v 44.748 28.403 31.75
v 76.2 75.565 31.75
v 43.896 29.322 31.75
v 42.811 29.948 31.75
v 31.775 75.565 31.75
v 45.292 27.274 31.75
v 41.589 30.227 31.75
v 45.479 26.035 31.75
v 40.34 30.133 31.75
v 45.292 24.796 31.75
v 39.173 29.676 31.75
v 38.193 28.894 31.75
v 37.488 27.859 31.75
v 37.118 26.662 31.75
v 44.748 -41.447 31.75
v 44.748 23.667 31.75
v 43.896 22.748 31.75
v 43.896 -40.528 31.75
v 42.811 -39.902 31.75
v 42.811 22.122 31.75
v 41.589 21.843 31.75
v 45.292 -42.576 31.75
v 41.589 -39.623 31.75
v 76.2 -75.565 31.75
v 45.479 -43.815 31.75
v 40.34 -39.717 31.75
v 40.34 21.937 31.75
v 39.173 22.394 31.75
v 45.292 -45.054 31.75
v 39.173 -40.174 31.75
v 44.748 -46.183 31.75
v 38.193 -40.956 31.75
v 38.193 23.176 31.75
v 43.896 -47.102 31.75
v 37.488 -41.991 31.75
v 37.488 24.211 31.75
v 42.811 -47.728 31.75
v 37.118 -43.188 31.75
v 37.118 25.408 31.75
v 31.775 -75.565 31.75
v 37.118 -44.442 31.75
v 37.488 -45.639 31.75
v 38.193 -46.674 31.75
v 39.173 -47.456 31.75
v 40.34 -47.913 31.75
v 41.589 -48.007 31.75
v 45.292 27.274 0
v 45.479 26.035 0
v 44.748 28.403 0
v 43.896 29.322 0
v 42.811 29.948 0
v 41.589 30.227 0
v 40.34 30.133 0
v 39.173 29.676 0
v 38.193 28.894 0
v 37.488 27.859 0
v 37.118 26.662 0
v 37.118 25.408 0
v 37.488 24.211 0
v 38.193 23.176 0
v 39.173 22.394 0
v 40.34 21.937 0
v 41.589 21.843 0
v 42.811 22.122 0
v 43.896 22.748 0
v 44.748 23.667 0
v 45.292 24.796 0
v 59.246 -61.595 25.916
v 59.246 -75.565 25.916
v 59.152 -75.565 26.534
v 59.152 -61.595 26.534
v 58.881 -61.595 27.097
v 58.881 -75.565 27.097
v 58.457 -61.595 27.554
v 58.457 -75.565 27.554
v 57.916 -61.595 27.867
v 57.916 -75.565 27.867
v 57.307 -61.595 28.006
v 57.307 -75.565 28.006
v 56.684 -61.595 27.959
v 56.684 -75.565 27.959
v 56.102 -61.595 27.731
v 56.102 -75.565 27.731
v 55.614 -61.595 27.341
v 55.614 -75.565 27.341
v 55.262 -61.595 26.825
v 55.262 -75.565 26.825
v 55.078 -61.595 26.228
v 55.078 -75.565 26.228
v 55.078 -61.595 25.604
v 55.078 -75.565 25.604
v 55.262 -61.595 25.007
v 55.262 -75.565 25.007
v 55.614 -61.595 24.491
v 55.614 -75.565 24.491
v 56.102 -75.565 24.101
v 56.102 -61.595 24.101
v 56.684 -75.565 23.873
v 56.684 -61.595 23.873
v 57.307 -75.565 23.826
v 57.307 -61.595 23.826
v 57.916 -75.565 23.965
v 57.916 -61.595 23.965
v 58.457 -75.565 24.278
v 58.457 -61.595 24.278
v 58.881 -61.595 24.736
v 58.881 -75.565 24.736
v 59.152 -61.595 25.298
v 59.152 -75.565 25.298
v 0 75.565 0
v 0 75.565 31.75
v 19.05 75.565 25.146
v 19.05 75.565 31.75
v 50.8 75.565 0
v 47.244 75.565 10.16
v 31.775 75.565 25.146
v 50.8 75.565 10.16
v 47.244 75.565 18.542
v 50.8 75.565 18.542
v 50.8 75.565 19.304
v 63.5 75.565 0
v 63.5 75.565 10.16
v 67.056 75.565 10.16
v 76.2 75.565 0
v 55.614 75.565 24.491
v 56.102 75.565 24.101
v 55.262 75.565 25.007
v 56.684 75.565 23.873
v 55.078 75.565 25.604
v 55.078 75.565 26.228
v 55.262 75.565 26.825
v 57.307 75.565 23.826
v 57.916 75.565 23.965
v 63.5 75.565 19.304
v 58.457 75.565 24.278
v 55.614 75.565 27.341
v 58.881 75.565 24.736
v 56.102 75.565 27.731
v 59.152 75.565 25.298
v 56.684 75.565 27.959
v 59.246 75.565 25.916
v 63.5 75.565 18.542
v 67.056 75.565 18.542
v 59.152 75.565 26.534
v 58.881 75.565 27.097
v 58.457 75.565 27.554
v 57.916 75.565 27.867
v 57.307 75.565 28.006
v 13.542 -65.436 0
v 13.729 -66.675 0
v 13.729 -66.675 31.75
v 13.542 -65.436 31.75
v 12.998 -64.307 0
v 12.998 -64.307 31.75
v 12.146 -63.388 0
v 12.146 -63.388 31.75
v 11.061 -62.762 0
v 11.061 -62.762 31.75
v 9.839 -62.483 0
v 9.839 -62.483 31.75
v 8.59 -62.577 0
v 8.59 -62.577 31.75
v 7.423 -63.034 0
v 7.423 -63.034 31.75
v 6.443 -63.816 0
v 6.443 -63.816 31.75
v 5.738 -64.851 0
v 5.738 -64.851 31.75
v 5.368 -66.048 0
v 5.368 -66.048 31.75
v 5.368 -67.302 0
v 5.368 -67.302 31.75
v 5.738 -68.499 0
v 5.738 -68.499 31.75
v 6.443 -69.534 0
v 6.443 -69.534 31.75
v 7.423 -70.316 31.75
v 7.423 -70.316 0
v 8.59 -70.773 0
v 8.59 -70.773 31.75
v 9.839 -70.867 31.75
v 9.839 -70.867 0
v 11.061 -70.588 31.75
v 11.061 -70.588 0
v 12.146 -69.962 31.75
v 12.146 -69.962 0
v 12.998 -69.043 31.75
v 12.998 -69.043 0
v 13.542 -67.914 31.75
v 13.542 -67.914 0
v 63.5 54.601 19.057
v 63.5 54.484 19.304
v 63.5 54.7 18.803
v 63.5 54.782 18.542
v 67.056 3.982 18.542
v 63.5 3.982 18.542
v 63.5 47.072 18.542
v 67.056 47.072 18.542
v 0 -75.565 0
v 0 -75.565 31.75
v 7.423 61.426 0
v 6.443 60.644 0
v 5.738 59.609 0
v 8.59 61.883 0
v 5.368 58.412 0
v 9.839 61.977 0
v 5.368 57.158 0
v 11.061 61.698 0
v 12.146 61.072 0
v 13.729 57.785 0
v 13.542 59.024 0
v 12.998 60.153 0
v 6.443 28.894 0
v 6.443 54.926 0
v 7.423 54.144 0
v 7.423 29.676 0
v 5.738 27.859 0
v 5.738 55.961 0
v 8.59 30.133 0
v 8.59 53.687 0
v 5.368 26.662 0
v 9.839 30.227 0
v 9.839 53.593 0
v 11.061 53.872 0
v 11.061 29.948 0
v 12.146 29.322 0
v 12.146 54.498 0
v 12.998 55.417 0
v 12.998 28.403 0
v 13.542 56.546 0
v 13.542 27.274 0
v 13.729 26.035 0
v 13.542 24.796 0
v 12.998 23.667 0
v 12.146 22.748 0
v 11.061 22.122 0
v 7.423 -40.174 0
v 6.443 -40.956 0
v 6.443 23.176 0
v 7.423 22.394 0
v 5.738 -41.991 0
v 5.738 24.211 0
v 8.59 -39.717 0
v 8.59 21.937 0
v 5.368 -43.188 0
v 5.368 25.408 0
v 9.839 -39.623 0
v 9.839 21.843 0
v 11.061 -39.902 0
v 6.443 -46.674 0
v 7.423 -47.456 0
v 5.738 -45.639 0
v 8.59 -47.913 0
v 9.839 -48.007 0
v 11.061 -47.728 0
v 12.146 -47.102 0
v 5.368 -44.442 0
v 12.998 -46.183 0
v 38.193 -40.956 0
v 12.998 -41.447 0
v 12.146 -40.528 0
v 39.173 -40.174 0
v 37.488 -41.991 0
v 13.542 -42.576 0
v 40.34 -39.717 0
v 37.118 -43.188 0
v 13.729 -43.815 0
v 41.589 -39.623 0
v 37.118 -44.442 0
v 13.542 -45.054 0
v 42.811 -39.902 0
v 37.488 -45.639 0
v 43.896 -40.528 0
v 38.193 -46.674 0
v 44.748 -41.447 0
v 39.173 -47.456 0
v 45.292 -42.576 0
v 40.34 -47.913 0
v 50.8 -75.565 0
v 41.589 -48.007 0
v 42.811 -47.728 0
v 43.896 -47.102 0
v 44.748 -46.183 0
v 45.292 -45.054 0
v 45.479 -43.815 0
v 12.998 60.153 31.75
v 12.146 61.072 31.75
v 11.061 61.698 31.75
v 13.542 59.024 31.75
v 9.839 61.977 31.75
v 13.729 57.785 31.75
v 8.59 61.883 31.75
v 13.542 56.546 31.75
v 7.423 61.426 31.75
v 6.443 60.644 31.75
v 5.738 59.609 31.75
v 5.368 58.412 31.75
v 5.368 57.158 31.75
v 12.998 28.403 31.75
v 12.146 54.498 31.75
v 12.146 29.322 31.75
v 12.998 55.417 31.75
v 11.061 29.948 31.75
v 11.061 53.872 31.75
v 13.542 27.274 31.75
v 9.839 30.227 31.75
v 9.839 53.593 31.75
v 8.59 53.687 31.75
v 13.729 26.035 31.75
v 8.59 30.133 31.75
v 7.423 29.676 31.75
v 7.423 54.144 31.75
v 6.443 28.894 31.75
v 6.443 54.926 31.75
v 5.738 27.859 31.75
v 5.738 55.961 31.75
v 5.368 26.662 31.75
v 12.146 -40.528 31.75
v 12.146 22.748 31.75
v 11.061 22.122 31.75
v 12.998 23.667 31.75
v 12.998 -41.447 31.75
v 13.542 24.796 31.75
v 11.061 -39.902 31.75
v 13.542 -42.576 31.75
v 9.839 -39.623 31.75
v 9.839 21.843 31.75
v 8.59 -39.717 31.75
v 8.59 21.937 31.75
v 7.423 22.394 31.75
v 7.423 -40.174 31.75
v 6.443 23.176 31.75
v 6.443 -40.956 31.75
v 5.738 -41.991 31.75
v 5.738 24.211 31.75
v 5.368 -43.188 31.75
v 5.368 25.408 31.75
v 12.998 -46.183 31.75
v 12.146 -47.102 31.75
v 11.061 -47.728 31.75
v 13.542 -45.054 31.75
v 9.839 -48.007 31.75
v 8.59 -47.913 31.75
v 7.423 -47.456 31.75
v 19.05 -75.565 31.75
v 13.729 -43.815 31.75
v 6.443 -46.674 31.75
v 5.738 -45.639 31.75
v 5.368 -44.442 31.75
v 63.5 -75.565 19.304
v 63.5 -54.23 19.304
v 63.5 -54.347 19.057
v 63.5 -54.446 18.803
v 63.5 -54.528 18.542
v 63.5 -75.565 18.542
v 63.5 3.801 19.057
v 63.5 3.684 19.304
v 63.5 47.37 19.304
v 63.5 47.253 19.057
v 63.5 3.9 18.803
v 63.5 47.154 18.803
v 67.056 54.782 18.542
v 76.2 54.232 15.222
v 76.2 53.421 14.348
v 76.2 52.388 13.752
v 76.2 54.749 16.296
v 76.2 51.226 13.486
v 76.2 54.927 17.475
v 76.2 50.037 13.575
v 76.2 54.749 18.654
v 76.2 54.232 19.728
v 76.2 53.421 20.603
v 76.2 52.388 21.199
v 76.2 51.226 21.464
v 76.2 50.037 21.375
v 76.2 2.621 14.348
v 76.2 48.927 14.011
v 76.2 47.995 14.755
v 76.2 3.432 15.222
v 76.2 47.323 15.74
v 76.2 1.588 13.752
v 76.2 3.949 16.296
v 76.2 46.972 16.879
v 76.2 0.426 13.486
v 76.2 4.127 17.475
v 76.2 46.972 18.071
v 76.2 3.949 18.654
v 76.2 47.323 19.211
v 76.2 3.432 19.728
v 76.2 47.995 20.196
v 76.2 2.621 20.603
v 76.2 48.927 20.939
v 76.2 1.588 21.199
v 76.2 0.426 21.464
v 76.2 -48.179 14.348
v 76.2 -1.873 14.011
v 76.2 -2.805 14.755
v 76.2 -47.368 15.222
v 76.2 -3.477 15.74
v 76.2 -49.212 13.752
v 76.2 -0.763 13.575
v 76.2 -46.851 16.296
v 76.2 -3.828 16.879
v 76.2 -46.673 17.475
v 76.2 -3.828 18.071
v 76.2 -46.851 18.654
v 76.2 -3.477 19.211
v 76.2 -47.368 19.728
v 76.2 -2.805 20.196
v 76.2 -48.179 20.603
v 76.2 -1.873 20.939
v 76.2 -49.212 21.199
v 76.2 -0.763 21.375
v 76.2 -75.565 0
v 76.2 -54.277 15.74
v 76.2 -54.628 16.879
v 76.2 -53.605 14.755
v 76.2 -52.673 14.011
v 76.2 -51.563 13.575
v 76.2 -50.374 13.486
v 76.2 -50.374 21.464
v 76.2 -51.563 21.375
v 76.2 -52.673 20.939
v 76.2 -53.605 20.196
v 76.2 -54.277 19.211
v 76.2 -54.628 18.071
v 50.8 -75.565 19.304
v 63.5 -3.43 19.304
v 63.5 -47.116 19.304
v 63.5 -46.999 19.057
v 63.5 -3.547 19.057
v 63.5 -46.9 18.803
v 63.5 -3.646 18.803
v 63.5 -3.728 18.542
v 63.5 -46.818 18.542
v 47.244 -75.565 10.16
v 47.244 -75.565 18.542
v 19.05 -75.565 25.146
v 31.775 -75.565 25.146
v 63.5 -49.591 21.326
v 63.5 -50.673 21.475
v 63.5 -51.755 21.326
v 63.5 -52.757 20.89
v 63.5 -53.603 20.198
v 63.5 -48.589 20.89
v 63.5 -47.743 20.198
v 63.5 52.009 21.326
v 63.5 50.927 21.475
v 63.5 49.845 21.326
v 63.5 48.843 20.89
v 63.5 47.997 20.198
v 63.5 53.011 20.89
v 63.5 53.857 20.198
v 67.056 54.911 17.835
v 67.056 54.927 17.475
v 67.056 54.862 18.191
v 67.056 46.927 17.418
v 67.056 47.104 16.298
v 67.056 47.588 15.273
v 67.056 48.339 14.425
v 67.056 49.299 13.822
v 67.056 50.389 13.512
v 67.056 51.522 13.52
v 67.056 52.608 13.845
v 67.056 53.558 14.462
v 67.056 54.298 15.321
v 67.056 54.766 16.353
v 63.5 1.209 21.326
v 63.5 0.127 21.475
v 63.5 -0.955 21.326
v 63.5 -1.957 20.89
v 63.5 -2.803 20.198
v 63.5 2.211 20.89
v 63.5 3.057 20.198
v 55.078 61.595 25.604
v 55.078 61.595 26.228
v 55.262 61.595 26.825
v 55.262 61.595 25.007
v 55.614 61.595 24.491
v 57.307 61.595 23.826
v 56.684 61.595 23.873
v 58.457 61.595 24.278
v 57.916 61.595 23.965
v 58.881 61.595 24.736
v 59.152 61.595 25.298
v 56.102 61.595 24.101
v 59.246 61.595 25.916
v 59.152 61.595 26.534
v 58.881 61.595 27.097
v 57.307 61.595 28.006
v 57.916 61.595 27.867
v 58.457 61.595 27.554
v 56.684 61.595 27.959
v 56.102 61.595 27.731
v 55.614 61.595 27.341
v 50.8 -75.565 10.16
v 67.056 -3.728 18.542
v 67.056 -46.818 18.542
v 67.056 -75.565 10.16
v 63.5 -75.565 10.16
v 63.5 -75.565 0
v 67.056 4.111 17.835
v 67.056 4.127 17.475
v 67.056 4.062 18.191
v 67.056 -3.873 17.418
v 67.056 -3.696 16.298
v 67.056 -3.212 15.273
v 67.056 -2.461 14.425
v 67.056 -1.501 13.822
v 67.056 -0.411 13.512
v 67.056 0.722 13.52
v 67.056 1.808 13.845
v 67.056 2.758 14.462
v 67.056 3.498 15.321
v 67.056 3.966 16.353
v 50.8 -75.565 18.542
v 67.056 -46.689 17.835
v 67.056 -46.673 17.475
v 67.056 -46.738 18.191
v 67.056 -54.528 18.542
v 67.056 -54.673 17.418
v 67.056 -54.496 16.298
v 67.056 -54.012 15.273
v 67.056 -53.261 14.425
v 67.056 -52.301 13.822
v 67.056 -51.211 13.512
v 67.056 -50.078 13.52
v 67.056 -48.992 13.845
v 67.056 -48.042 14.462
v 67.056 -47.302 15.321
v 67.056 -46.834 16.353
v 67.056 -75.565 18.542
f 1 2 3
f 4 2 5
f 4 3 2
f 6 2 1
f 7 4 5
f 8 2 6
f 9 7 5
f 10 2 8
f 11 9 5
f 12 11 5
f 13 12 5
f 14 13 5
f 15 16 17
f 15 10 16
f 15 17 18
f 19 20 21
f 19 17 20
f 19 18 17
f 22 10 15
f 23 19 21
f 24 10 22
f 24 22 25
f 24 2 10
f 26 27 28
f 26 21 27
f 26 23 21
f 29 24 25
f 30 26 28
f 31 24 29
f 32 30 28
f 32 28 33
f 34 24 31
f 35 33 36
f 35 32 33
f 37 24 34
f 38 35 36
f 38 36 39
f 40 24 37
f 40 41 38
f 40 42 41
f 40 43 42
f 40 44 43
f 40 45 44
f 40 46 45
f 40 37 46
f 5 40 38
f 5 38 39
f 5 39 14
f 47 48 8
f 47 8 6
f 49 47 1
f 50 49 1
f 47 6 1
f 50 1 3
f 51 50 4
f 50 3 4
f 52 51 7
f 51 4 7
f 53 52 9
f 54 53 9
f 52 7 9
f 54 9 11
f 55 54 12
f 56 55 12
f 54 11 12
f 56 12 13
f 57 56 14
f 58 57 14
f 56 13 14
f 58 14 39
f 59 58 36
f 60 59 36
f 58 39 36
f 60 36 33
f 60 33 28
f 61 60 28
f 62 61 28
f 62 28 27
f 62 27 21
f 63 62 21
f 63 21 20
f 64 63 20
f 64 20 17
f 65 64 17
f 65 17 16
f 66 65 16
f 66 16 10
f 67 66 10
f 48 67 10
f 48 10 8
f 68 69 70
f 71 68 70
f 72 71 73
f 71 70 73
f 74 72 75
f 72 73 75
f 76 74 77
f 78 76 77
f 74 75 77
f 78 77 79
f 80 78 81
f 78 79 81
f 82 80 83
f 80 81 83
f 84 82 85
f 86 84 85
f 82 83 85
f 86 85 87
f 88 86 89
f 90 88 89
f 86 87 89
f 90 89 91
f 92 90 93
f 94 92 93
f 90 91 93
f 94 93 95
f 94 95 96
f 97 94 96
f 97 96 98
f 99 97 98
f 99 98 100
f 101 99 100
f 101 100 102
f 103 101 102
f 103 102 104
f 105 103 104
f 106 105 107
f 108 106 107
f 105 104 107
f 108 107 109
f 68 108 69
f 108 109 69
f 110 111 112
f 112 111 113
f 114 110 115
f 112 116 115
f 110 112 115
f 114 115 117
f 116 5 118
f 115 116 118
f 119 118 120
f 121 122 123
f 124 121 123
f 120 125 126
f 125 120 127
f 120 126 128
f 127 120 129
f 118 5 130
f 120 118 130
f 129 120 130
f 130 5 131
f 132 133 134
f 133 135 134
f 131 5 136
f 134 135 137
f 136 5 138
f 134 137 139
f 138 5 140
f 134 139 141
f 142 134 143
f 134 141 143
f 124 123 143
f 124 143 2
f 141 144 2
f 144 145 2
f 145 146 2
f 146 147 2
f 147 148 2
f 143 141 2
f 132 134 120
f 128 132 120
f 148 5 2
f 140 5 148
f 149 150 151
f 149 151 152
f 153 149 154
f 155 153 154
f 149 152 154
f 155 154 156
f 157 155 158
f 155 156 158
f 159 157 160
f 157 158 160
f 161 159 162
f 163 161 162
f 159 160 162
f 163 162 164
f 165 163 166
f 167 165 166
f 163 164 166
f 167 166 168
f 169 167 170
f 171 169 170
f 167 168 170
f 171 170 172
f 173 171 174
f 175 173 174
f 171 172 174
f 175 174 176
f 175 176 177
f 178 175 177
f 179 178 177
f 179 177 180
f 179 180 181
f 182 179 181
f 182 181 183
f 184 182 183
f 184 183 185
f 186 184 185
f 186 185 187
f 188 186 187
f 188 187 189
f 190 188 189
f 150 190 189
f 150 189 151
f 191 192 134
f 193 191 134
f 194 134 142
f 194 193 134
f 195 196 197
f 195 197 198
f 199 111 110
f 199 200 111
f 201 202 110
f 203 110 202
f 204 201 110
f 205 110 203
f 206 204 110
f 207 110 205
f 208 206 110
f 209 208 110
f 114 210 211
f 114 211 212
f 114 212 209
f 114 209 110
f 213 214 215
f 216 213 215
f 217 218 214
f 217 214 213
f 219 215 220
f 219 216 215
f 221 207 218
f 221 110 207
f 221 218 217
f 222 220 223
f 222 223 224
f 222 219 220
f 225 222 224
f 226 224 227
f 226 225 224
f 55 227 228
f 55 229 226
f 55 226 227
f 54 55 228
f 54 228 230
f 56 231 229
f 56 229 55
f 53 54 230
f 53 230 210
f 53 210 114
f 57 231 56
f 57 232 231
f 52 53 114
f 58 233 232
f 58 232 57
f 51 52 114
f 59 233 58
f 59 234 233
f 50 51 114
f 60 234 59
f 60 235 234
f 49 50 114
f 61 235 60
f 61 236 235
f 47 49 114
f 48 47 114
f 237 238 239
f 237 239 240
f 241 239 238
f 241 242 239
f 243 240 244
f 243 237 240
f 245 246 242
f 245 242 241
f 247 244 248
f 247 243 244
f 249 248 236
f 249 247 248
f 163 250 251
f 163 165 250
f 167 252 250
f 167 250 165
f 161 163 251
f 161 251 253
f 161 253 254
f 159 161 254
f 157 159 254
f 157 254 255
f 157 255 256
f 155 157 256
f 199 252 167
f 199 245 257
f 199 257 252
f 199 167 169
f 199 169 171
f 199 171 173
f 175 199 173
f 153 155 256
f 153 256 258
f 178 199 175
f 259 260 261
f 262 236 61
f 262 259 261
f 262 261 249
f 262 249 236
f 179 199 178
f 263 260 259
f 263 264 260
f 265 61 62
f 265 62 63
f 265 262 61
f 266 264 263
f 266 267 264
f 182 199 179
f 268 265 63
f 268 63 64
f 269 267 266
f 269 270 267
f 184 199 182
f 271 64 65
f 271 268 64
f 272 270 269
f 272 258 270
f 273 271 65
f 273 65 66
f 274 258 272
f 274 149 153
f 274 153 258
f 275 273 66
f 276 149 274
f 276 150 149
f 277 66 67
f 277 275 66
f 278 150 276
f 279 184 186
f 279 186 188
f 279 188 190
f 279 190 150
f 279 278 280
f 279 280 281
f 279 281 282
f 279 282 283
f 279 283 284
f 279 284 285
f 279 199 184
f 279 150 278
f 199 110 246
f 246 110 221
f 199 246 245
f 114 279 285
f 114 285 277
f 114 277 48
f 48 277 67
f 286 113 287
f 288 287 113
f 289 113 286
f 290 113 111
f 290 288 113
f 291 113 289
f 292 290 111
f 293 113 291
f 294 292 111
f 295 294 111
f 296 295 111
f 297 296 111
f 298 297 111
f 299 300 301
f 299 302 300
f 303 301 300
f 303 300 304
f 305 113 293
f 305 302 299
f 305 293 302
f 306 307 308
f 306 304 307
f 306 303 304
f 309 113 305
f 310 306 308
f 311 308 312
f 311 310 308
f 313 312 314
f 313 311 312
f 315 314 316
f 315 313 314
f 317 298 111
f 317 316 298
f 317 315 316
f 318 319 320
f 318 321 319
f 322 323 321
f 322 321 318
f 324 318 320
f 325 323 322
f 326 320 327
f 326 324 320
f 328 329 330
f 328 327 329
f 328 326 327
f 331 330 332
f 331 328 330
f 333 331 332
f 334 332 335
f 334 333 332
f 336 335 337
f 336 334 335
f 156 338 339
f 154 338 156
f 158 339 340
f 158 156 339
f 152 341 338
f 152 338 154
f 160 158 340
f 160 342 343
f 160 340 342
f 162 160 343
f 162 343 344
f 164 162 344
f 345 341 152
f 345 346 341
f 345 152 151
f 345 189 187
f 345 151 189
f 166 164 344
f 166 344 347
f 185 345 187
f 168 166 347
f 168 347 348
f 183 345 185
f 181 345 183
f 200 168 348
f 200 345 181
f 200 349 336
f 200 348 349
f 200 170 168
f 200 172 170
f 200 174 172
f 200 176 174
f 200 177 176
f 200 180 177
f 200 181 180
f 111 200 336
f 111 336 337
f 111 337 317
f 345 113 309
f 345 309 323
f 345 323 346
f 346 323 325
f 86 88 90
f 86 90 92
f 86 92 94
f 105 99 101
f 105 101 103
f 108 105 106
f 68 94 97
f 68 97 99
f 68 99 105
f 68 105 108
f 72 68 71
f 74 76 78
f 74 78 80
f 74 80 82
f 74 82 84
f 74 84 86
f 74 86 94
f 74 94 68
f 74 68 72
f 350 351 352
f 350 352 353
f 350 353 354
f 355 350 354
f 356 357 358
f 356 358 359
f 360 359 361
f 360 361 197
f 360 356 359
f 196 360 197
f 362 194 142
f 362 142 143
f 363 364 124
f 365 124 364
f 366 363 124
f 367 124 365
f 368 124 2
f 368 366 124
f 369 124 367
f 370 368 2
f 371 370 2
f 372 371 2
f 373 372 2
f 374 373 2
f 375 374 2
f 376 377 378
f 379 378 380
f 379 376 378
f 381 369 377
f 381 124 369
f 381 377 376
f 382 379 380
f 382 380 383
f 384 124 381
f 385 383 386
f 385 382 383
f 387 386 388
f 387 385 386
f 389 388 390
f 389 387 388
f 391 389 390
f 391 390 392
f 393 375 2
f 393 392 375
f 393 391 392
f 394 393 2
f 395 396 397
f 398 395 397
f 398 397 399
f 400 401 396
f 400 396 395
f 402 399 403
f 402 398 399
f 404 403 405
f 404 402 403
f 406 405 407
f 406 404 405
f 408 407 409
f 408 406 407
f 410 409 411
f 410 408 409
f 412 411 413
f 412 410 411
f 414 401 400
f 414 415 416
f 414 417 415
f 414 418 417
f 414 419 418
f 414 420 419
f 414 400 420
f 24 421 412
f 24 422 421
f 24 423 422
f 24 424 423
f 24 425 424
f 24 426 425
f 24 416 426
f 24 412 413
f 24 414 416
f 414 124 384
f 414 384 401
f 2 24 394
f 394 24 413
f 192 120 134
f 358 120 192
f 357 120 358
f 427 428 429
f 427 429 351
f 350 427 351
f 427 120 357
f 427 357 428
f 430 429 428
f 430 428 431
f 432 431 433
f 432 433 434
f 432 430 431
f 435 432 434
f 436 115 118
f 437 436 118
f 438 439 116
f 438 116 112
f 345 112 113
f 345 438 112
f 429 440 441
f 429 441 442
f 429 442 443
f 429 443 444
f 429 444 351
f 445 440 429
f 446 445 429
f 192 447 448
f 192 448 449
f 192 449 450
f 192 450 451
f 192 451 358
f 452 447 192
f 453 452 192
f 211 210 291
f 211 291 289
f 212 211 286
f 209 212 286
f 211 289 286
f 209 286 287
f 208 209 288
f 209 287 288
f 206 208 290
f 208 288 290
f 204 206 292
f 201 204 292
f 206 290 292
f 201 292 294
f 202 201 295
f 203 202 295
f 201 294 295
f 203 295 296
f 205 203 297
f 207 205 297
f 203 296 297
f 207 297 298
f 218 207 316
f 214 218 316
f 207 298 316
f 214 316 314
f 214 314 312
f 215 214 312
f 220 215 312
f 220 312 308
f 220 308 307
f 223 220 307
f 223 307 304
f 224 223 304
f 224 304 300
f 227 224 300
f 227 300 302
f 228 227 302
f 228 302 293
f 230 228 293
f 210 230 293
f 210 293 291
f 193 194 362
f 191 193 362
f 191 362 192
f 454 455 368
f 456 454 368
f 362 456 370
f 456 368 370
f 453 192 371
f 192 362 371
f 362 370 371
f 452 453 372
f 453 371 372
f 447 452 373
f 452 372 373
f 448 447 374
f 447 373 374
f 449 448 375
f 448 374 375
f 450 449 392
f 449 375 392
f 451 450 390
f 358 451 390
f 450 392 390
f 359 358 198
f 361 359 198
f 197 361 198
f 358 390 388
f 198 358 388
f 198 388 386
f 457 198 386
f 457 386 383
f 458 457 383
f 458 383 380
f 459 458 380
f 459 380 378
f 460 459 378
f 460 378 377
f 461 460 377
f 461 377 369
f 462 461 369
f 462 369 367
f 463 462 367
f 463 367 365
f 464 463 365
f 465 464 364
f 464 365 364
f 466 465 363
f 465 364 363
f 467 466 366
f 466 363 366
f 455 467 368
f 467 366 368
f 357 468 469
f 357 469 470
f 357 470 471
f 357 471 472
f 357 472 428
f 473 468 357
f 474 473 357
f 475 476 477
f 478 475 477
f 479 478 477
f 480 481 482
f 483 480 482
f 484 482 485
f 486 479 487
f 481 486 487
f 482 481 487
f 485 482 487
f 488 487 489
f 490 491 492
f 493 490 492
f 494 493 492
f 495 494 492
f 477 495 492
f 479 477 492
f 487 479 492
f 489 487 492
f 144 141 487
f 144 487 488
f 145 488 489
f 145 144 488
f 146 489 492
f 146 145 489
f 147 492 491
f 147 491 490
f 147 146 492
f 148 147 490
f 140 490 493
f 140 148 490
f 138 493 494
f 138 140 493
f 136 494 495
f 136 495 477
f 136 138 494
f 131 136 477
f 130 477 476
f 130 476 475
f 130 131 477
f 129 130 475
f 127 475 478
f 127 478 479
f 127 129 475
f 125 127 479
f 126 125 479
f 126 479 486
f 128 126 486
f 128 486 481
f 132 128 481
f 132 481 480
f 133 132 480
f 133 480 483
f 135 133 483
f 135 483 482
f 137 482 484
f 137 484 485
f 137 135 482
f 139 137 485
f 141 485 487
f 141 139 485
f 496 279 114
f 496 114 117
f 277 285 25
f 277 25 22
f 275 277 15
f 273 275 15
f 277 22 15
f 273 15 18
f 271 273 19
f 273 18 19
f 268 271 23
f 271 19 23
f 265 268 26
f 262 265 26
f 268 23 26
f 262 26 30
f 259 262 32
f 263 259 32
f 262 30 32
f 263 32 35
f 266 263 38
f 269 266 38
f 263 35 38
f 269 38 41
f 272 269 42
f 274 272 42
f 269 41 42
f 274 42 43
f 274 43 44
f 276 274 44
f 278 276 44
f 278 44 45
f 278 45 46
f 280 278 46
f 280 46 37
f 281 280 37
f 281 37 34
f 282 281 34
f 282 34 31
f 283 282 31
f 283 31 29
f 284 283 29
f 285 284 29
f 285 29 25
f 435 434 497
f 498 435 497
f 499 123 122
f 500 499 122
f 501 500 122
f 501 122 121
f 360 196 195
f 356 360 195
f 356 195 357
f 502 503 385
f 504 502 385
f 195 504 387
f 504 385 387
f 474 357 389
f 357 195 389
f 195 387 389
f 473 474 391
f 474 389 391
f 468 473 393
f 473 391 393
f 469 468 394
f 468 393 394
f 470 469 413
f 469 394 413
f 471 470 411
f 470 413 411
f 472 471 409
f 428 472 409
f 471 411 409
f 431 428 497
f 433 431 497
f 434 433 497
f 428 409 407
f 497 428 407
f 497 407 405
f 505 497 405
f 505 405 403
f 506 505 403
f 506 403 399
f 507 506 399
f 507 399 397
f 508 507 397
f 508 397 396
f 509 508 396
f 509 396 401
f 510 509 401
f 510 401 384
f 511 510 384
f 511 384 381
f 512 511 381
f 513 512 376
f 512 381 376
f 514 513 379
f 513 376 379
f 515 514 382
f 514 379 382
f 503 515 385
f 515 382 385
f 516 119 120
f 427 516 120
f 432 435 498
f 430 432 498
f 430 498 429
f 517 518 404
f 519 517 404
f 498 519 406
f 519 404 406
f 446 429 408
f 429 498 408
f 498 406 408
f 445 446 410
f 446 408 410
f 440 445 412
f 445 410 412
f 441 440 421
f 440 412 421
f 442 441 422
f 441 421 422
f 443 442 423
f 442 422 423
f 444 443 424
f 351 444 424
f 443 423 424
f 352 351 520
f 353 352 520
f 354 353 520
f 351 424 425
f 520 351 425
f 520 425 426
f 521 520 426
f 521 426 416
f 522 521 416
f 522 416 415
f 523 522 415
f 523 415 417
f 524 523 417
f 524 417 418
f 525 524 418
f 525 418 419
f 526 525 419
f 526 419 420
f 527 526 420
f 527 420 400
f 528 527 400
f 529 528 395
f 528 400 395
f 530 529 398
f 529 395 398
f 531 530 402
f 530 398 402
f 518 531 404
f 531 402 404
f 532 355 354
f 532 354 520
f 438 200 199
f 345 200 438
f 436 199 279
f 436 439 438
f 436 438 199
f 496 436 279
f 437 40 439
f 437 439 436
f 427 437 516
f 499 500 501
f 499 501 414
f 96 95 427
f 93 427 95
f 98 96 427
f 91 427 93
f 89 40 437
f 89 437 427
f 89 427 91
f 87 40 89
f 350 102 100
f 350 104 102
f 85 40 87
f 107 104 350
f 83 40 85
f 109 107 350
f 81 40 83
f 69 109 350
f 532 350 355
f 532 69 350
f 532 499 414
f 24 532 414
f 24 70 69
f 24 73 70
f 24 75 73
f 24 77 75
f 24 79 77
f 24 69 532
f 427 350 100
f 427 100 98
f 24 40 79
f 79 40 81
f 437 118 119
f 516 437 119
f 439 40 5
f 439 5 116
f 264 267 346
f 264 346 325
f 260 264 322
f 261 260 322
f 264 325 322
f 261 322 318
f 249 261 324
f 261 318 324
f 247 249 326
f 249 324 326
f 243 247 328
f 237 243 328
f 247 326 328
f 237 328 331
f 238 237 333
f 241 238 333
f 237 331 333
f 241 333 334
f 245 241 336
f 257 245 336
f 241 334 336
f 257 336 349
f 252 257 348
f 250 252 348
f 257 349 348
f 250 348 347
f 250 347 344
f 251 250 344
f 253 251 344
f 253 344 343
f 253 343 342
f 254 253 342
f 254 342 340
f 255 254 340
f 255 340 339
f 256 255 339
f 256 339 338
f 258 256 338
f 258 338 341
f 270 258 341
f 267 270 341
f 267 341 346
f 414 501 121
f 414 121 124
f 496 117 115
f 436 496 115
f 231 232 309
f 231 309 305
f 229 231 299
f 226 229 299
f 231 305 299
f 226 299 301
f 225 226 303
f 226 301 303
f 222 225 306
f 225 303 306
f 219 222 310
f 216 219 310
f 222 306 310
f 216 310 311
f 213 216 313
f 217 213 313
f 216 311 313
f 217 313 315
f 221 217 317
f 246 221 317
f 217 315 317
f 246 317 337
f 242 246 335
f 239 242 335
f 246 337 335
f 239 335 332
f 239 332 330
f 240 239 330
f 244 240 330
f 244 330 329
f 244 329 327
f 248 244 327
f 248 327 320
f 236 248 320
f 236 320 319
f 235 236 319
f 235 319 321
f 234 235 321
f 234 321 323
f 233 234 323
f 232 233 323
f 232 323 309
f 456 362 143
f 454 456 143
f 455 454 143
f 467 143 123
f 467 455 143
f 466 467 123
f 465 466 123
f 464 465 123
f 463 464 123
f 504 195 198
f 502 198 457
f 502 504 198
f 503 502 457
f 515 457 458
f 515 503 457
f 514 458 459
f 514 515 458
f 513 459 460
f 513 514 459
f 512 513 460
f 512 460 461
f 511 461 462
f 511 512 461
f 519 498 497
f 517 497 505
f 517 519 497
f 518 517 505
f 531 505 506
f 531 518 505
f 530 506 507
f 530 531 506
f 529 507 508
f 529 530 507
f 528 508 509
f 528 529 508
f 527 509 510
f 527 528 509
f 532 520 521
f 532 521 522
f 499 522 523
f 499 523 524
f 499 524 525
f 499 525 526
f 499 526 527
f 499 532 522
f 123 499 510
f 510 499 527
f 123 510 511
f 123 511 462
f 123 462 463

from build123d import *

# Parameters (mm, degrees)
F1_DEPTH = 75.565
F2_R     = 2.0955
F3_DEPTH = 13.97
F4_R     = 4
F5_DEPTH = 12.7
F6_R     = 4.2037
F7_DEPTH = 31.751


# Not quite as in the source:
# - a pattern or mirror of a feature is missing from the dataset's text; its kind, count and spacing are read off the source's solid


with BuildPart() as f1:
    # F0 (on Front) → F1 (new body, symmetric)
    with BuildSketch(Plane.XZ):
        Polygon((0, 31.75), (0, 0), (50.8, 0), (50.8, 10.16), (47.244, 10.16), (47.244, 18.542), (50.8, 18.542), (50.8, 19.304), (63.5, 19.304), (63.5, 18.542), (67.056, 18.542), (67.056, 10.16), (63.5, 10.16), (63.5, 0), (76.2, 0), (76.2, 31.75), (31.7754, 31.75), (31.7754, 25.146), (19.05, 25.146), (19.05, 31.75), align=None)
    extrude(amount=F1_DEPTH, both=True)

    # F2 (on face) → F3 (cut)
    with BuildSketch(Plane.XZ.offset(75.565)):
        with Locations((57.15, 25.9160771966)):
            Circle(F2_R)
    f3 = extrude(amount=-F3_DEPTH, mode=Mode.SUBTRACT)

    # F3_copies: F3 across plane
    add(f3.mirror(Plane.ZX), mode=Mode.SUBTRACT)

    # F4 (on face) → F5 (cut)
    with BuildSketch(Plane.YZ.offset(76.2)):
        with Locations((-50.673, 17.4752)):
            Circle(F4_R)
        with Locations((0.127, 17.4752)):
            Circle(F4_R)
        with Locations((50.927, 17.4752)):
            Circle(F4_R)
    extrude(amount=-F5_DEPTH, mode=Mode.SUBTRACT)

    # F6 (on face) → F7 (cut, through all)
    with BuildSketch(Plane.XY.offset(31.75)):
        with Locations((9.525, 57.785)):
            Circle(F6_R)
        with Locations((9.525, 26.035)):
            Circle(F6_R)
        with Locations((41.275, 26.035)):
            Circle(F6_R)
        with Locations((41.275, -43.815)):
            Circle(F6_R)
        with Locations((9.525, -43.815)):
            Circle(F6_R)
        with Locations((9.525, -66.675)):
            Circle(F6_R)
    extrude(amount=-F7_DEPTH, mode=Mode.SUBTRACT)


solid = f1.part
